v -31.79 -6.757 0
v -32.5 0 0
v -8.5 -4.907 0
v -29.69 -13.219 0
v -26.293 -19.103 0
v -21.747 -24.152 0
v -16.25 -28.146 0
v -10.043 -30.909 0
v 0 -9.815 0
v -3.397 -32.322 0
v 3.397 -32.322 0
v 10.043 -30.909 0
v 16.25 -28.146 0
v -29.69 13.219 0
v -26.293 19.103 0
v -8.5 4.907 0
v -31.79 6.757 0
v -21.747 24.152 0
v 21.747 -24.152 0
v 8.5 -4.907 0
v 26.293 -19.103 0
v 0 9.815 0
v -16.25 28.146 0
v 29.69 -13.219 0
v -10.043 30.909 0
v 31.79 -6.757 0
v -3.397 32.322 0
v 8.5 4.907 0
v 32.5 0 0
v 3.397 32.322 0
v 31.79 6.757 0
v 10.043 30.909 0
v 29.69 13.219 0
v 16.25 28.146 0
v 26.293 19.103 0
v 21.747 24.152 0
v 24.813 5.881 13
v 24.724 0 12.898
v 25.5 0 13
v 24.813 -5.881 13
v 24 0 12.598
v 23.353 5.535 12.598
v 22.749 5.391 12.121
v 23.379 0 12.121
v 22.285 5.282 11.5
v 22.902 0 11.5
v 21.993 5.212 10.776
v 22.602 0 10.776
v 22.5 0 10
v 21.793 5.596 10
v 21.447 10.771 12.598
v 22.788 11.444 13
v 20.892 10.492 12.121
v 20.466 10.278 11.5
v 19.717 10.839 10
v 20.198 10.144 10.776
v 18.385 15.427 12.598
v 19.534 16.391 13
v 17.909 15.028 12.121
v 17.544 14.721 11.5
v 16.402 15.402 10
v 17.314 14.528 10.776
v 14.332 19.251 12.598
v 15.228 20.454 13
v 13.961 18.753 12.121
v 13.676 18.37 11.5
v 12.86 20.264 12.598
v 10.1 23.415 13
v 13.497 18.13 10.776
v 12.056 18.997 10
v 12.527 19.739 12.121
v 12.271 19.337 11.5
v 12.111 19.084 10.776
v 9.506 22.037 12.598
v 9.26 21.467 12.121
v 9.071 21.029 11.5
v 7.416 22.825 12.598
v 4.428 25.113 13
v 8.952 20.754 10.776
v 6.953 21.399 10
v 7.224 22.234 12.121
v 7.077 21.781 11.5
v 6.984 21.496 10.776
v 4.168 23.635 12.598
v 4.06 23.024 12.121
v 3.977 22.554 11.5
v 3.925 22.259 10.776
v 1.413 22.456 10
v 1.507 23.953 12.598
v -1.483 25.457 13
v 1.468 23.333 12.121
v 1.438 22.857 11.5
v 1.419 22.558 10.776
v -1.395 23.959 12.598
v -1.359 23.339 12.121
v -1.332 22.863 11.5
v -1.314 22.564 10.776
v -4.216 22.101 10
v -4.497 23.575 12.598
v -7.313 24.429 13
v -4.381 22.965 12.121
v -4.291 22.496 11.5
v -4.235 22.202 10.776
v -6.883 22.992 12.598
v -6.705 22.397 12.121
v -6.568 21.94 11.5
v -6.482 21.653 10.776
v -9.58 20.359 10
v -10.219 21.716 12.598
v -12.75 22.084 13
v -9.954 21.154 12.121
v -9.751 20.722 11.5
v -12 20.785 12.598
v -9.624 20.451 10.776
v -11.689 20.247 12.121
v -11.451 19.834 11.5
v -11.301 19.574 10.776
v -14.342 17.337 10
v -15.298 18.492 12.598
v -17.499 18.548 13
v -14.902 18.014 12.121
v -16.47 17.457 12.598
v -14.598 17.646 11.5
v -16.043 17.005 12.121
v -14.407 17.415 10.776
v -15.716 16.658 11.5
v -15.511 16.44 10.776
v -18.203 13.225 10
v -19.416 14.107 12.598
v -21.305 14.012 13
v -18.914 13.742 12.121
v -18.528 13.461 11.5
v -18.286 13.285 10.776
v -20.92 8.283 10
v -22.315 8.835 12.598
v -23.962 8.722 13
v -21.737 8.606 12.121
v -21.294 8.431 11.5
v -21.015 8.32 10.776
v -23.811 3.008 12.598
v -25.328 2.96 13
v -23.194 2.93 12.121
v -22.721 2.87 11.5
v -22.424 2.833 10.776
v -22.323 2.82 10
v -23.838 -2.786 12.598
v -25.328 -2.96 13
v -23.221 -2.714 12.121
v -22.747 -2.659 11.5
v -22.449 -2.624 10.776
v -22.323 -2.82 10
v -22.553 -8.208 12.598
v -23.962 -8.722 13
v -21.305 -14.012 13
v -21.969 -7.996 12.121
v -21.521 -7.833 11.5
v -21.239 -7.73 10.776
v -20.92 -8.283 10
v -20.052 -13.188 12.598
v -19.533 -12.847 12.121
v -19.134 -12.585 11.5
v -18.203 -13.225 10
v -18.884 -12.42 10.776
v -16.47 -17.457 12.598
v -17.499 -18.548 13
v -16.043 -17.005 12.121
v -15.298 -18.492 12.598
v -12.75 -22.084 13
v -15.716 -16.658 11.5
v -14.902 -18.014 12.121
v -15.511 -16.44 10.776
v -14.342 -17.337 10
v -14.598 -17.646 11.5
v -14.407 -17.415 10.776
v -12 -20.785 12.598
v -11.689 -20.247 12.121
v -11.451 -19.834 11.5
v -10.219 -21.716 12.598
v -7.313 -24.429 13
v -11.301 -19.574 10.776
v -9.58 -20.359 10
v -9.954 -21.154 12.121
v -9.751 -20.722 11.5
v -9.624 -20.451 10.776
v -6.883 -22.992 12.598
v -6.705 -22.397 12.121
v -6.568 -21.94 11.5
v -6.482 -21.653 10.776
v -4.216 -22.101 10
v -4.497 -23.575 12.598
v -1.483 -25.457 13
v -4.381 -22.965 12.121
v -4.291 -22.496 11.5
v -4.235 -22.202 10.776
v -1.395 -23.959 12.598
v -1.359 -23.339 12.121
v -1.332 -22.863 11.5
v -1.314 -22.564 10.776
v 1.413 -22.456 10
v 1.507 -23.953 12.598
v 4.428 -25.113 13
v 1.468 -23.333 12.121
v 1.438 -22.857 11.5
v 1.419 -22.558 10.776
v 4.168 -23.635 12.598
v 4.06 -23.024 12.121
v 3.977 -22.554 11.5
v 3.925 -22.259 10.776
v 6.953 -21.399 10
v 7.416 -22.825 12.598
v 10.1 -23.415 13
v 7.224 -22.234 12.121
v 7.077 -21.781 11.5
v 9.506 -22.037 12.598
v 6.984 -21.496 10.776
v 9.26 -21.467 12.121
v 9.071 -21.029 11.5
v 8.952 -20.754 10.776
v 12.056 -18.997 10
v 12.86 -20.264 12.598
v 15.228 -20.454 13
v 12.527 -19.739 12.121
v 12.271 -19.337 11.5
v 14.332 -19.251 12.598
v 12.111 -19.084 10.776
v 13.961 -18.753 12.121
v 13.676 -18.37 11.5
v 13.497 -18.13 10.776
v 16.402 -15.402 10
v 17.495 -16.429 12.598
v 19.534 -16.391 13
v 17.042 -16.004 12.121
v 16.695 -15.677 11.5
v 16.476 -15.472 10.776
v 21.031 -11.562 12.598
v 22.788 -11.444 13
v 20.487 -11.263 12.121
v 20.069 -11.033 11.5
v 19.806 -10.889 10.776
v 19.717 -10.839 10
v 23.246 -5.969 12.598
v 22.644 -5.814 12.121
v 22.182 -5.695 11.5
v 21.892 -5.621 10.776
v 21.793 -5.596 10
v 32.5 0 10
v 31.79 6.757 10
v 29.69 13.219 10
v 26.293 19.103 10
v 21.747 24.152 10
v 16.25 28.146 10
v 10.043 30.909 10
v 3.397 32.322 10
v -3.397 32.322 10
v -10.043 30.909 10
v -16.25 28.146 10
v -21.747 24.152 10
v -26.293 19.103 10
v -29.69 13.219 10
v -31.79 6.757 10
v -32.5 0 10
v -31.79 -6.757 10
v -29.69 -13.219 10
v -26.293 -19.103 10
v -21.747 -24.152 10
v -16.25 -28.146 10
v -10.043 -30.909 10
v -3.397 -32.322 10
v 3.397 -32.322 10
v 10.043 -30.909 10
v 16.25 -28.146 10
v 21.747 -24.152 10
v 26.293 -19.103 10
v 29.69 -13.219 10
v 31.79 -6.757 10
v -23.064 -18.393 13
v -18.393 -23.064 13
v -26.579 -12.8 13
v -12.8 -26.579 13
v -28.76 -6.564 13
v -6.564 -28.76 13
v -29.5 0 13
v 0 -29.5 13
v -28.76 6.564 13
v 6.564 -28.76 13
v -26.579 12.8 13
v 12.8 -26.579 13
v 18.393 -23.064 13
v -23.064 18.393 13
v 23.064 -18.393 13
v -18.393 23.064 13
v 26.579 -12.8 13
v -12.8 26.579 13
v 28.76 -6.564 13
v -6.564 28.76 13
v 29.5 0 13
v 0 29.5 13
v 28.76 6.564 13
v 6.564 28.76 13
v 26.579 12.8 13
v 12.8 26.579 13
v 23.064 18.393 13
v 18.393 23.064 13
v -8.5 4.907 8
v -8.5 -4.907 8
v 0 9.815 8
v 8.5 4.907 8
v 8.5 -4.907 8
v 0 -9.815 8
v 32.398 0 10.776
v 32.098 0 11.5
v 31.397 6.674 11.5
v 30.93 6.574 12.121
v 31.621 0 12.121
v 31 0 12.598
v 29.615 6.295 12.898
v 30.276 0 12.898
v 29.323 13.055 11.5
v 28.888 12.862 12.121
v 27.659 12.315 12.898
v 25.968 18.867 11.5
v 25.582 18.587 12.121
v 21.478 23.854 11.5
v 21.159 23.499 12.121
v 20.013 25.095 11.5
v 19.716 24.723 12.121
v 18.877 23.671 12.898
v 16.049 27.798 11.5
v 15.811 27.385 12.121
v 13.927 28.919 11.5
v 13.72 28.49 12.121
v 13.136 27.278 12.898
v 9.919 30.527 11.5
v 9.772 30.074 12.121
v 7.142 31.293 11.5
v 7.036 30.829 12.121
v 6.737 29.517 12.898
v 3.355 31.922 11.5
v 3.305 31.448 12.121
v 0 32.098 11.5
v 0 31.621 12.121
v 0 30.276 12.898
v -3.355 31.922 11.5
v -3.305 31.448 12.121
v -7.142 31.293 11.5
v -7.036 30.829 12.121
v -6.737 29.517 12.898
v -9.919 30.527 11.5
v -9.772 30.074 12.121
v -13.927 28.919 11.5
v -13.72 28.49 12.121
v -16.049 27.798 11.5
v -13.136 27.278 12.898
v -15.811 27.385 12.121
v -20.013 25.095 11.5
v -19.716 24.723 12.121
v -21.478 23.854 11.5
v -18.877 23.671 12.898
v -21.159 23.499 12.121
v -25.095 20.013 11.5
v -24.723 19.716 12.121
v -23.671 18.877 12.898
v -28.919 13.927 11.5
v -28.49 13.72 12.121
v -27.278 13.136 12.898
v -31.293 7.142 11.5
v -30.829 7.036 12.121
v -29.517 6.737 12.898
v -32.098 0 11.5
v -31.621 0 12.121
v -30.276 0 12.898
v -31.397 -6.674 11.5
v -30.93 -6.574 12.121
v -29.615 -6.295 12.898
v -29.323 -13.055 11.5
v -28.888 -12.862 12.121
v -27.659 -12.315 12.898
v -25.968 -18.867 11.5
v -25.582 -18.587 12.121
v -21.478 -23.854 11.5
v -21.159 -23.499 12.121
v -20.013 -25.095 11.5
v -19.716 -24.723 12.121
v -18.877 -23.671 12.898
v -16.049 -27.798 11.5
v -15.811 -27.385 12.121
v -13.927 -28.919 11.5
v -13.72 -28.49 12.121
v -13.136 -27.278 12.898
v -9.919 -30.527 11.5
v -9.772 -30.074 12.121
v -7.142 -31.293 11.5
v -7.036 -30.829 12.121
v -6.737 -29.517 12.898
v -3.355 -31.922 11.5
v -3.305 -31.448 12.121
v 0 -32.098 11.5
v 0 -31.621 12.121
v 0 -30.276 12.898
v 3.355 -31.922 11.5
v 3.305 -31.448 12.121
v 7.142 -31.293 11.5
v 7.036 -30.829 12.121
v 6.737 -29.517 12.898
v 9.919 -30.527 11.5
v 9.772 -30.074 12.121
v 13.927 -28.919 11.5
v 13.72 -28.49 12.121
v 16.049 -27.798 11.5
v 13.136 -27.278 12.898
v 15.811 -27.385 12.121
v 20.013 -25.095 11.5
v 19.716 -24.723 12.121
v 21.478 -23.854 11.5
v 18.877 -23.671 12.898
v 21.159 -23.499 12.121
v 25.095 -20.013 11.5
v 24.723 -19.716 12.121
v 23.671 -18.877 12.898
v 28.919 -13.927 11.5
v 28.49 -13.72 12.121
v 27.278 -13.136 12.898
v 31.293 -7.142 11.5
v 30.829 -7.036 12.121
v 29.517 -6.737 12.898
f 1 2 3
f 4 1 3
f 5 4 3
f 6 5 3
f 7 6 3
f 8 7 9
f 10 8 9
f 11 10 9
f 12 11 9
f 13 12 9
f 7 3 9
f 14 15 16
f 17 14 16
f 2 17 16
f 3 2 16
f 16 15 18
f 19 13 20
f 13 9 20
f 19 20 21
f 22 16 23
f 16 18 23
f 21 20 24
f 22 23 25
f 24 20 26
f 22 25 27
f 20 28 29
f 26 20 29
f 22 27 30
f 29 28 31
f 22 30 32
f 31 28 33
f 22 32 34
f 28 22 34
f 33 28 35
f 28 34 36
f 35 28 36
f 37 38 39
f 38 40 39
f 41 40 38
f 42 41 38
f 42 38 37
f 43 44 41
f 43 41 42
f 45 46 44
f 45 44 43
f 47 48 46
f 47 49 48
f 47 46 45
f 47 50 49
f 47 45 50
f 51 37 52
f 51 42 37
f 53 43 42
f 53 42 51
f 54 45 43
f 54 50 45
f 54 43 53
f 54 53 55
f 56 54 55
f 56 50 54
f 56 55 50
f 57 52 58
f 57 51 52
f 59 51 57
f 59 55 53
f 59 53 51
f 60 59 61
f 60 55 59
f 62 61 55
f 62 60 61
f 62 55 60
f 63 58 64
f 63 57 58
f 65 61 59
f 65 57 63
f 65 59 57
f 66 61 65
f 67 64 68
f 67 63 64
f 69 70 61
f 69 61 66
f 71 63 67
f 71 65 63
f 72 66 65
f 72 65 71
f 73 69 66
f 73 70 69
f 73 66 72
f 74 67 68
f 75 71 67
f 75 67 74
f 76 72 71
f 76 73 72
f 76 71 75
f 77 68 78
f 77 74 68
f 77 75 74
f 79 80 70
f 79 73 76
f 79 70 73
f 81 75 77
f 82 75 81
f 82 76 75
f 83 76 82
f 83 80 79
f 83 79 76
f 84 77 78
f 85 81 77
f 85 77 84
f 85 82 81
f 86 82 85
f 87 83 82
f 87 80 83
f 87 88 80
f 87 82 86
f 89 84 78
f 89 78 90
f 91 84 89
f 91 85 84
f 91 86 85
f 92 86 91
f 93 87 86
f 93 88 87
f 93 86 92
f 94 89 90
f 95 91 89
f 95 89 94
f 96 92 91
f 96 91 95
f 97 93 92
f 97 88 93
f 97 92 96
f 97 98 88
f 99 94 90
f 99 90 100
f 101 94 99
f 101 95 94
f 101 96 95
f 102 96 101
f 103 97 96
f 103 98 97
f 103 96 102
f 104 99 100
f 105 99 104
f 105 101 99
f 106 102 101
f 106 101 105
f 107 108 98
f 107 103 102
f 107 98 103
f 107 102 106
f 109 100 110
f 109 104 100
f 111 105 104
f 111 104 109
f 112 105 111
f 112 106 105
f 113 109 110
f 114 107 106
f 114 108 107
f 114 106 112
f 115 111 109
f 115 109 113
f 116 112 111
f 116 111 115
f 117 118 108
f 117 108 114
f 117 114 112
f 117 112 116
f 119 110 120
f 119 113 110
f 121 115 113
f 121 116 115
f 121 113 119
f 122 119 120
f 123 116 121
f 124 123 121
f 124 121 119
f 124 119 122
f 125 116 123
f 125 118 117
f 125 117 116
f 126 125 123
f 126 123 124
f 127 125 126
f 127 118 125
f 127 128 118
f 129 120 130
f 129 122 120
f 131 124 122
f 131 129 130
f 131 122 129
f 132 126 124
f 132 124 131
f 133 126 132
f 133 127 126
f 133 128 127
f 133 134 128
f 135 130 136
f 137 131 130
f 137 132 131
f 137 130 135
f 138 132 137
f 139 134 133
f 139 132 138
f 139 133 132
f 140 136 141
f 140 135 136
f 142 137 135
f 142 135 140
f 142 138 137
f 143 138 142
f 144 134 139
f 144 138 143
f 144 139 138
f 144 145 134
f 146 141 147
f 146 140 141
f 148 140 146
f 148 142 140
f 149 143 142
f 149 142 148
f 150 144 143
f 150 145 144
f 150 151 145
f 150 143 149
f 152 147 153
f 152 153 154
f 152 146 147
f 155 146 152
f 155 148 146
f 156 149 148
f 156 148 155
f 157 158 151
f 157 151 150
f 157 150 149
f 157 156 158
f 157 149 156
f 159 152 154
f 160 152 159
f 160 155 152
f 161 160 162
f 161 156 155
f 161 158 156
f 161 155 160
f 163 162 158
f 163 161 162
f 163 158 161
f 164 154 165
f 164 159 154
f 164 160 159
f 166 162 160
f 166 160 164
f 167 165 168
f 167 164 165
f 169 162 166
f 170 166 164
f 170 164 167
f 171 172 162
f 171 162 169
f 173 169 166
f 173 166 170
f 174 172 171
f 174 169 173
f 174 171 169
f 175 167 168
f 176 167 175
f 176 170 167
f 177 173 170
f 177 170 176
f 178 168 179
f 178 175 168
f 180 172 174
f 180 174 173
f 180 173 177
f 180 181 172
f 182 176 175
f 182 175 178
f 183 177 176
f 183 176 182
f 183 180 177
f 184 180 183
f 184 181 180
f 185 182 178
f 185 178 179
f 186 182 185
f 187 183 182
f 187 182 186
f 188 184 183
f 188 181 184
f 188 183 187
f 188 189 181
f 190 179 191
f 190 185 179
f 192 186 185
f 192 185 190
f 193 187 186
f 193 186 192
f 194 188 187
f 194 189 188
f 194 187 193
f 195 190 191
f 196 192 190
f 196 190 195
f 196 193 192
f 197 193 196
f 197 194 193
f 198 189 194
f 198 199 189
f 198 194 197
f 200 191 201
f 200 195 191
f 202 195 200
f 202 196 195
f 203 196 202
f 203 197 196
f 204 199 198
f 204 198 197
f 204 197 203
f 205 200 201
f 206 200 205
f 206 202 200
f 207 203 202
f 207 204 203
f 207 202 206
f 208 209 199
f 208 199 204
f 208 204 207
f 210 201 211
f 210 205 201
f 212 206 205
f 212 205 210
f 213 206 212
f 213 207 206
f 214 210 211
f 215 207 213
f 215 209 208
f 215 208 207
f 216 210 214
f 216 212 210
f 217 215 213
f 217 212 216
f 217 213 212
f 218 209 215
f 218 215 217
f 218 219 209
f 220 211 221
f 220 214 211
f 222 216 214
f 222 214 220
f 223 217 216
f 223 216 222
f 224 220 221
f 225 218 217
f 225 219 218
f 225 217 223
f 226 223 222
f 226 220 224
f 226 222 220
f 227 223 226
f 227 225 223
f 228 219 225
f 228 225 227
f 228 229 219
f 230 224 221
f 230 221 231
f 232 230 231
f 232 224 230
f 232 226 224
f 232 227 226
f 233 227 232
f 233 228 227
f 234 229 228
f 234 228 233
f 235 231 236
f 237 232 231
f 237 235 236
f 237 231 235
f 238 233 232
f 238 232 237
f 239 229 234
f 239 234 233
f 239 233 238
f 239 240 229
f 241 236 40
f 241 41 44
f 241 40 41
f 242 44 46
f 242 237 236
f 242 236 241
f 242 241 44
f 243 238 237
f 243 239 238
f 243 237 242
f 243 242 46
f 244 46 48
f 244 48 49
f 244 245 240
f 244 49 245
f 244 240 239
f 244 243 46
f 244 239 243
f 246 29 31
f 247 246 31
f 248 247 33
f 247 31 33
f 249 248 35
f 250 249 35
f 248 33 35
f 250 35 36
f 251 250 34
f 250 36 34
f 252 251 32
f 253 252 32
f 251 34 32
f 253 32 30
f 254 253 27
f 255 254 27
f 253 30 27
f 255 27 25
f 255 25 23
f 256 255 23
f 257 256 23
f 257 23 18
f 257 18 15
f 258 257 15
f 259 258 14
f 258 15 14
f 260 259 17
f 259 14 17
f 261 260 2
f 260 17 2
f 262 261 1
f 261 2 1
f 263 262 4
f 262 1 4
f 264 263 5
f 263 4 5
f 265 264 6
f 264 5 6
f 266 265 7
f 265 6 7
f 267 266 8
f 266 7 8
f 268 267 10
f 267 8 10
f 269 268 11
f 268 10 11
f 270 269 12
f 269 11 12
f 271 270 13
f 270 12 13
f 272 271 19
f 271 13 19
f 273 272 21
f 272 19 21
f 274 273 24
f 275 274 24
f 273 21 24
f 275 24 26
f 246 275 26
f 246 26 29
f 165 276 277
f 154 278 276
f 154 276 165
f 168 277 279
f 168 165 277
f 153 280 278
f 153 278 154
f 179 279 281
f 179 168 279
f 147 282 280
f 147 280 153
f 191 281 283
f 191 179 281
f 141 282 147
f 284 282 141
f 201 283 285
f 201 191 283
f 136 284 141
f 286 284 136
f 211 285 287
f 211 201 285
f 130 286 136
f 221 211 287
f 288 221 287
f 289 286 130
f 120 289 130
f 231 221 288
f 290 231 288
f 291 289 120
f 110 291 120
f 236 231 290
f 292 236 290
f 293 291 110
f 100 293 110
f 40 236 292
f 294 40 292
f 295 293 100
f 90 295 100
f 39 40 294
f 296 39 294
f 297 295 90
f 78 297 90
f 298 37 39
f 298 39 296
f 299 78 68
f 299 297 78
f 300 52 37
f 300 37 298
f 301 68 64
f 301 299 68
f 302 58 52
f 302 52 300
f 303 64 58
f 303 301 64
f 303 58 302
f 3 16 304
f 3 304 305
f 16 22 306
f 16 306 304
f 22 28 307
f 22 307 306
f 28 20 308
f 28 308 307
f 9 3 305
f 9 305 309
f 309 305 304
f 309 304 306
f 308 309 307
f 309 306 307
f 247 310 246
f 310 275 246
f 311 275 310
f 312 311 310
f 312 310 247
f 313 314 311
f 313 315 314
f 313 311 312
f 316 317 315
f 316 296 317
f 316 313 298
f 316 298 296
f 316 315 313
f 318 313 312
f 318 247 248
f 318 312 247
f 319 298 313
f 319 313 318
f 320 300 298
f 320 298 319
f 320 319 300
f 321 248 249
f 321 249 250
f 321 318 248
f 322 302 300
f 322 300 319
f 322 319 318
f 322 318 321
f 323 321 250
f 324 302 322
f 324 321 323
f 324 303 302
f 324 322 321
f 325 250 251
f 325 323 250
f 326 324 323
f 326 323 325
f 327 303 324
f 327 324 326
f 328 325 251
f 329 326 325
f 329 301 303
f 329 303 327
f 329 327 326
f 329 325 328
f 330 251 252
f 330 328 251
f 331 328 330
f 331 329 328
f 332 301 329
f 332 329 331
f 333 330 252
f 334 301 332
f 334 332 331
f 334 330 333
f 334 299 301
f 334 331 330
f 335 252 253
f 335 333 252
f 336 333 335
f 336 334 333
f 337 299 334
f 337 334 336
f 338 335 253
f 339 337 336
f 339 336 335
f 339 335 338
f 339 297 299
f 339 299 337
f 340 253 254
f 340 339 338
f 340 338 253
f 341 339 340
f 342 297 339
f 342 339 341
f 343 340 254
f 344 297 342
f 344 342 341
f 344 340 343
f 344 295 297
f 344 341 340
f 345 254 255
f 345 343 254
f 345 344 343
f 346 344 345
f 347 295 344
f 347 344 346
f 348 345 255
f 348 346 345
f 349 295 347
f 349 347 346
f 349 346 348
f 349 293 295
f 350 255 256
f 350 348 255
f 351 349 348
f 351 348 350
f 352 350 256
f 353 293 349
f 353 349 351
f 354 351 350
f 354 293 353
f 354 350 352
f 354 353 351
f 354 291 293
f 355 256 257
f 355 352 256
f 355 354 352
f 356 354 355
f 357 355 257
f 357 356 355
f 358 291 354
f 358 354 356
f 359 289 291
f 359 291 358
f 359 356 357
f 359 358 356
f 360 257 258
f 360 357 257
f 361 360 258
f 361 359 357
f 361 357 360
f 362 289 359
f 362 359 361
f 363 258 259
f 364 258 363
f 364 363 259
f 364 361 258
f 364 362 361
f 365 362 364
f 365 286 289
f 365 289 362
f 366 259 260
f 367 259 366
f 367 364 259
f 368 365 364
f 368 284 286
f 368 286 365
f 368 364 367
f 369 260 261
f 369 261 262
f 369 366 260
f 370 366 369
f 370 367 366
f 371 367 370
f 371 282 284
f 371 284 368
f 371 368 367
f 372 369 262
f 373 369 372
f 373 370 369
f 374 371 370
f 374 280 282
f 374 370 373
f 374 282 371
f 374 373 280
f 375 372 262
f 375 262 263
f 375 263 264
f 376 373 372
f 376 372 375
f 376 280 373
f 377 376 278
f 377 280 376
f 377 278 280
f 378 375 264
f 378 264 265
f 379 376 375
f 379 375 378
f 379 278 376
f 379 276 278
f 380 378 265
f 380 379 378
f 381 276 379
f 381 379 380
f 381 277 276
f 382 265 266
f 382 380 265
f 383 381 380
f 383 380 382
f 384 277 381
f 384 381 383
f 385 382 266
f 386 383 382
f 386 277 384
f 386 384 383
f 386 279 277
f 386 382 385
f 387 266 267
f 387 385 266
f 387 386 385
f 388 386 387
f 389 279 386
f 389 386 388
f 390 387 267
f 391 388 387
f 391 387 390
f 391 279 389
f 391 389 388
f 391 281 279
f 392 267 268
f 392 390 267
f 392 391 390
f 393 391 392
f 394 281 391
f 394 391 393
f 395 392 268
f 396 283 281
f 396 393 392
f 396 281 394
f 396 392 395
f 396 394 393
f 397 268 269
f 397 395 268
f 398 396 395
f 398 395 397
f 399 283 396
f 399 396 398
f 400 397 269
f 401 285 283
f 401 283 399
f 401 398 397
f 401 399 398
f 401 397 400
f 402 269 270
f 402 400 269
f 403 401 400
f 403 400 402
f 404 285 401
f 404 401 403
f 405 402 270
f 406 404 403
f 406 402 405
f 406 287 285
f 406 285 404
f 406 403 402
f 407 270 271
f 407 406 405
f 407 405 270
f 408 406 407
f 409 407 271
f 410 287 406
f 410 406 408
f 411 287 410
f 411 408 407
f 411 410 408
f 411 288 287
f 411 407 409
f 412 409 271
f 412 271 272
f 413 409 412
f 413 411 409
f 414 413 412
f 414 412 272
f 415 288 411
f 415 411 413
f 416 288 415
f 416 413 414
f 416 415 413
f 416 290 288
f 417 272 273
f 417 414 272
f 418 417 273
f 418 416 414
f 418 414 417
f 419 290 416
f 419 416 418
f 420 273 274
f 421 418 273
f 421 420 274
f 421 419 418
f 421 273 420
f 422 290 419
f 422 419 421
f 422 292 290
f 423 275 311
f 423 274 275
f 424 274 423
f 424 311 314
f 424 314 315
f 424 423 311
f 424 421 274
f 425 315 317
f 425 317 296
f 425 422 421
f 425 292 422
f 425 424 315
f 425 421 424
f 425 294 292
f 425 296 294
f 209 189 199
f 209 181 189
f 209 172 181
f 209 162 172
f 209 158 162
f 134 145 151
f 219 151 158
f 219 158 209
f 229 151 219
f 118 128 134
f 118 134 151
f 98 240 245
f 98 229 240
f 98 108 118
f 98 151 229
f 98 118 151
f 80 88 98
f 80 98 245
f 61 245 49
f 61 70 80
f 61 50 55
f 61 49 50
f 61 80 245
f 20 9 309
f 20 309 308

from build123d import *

# Parameters (mm, degrees)
F0_R     = 32.5
F0_R_2   = 22.5
F1_DEPTH = 10
F2_DEPTH = 13
F3_DEPTH = 8
F4_R     = 2.99999


# Not quite as in the source:
# - a fillet or chamfer is up to 0.001 mm smaller than in the source, because OpenCascade refuses the exact size


with BuildPart() as f1:
    # F0 (on Top) → F1 (new body)
    with BuildSketch(Plane.XY):
        Circle(F0_R)
        Circle(F0_R_2, mode=Mode.SUBTRACT)
        Circle(F0_R_2)
        Polygon((-8.5, 4.9074772881), (0, 9.8149545762), (8.5, 4.9074772881), (8.5, -4.9074772881), (0, -9.8149545762), (-8.5, -4.9074772881), align=None, mode=Mode.SUBTRACT)
        Polygon((8.5, 4.9074772881), (0, 9.8149545762), (-8.5, 4.9074772881), (-8.5, -4.9074772881), (0, -9.8149545762), (8.5, -4.9074772881), align=None)
    extrude(amount=F1_DEPTH)

    # F0 (on Top) → F2 (join)
    with BuildSketch(Plane.XY):
        Circle(F0_R)
        Circle(F0_R_2, mode=Mode.SUBTRACT)
    extrude(amount=F2_DEPTH)

    # F0 (on Top) → F3 (cut)
    with BuildSketch(Plane.XY):
        Polygon((8.5, 4.9074772881), (0, 9.8149545762), (-8.5, 4.9074772881), (-8.5, -4.9074772881), (0, -9.8149545762), (8.5, -4.9074772881), align=None)
    extrude(amount=F3_DEPTH, mode=Mode.SUBTRACT)

    # F4 (radius 3 in the source; OpenCascade refuses exactly that, so slightly less here)
    f4_edges = [f1.edges().sort_by_distance(p)[0] for p in [
        (-32.5, 0, 13),
        (-22.5, 0, 13),
    ]]
    fillet(f4_edges, radius=F4_R)


solid = f1.part
